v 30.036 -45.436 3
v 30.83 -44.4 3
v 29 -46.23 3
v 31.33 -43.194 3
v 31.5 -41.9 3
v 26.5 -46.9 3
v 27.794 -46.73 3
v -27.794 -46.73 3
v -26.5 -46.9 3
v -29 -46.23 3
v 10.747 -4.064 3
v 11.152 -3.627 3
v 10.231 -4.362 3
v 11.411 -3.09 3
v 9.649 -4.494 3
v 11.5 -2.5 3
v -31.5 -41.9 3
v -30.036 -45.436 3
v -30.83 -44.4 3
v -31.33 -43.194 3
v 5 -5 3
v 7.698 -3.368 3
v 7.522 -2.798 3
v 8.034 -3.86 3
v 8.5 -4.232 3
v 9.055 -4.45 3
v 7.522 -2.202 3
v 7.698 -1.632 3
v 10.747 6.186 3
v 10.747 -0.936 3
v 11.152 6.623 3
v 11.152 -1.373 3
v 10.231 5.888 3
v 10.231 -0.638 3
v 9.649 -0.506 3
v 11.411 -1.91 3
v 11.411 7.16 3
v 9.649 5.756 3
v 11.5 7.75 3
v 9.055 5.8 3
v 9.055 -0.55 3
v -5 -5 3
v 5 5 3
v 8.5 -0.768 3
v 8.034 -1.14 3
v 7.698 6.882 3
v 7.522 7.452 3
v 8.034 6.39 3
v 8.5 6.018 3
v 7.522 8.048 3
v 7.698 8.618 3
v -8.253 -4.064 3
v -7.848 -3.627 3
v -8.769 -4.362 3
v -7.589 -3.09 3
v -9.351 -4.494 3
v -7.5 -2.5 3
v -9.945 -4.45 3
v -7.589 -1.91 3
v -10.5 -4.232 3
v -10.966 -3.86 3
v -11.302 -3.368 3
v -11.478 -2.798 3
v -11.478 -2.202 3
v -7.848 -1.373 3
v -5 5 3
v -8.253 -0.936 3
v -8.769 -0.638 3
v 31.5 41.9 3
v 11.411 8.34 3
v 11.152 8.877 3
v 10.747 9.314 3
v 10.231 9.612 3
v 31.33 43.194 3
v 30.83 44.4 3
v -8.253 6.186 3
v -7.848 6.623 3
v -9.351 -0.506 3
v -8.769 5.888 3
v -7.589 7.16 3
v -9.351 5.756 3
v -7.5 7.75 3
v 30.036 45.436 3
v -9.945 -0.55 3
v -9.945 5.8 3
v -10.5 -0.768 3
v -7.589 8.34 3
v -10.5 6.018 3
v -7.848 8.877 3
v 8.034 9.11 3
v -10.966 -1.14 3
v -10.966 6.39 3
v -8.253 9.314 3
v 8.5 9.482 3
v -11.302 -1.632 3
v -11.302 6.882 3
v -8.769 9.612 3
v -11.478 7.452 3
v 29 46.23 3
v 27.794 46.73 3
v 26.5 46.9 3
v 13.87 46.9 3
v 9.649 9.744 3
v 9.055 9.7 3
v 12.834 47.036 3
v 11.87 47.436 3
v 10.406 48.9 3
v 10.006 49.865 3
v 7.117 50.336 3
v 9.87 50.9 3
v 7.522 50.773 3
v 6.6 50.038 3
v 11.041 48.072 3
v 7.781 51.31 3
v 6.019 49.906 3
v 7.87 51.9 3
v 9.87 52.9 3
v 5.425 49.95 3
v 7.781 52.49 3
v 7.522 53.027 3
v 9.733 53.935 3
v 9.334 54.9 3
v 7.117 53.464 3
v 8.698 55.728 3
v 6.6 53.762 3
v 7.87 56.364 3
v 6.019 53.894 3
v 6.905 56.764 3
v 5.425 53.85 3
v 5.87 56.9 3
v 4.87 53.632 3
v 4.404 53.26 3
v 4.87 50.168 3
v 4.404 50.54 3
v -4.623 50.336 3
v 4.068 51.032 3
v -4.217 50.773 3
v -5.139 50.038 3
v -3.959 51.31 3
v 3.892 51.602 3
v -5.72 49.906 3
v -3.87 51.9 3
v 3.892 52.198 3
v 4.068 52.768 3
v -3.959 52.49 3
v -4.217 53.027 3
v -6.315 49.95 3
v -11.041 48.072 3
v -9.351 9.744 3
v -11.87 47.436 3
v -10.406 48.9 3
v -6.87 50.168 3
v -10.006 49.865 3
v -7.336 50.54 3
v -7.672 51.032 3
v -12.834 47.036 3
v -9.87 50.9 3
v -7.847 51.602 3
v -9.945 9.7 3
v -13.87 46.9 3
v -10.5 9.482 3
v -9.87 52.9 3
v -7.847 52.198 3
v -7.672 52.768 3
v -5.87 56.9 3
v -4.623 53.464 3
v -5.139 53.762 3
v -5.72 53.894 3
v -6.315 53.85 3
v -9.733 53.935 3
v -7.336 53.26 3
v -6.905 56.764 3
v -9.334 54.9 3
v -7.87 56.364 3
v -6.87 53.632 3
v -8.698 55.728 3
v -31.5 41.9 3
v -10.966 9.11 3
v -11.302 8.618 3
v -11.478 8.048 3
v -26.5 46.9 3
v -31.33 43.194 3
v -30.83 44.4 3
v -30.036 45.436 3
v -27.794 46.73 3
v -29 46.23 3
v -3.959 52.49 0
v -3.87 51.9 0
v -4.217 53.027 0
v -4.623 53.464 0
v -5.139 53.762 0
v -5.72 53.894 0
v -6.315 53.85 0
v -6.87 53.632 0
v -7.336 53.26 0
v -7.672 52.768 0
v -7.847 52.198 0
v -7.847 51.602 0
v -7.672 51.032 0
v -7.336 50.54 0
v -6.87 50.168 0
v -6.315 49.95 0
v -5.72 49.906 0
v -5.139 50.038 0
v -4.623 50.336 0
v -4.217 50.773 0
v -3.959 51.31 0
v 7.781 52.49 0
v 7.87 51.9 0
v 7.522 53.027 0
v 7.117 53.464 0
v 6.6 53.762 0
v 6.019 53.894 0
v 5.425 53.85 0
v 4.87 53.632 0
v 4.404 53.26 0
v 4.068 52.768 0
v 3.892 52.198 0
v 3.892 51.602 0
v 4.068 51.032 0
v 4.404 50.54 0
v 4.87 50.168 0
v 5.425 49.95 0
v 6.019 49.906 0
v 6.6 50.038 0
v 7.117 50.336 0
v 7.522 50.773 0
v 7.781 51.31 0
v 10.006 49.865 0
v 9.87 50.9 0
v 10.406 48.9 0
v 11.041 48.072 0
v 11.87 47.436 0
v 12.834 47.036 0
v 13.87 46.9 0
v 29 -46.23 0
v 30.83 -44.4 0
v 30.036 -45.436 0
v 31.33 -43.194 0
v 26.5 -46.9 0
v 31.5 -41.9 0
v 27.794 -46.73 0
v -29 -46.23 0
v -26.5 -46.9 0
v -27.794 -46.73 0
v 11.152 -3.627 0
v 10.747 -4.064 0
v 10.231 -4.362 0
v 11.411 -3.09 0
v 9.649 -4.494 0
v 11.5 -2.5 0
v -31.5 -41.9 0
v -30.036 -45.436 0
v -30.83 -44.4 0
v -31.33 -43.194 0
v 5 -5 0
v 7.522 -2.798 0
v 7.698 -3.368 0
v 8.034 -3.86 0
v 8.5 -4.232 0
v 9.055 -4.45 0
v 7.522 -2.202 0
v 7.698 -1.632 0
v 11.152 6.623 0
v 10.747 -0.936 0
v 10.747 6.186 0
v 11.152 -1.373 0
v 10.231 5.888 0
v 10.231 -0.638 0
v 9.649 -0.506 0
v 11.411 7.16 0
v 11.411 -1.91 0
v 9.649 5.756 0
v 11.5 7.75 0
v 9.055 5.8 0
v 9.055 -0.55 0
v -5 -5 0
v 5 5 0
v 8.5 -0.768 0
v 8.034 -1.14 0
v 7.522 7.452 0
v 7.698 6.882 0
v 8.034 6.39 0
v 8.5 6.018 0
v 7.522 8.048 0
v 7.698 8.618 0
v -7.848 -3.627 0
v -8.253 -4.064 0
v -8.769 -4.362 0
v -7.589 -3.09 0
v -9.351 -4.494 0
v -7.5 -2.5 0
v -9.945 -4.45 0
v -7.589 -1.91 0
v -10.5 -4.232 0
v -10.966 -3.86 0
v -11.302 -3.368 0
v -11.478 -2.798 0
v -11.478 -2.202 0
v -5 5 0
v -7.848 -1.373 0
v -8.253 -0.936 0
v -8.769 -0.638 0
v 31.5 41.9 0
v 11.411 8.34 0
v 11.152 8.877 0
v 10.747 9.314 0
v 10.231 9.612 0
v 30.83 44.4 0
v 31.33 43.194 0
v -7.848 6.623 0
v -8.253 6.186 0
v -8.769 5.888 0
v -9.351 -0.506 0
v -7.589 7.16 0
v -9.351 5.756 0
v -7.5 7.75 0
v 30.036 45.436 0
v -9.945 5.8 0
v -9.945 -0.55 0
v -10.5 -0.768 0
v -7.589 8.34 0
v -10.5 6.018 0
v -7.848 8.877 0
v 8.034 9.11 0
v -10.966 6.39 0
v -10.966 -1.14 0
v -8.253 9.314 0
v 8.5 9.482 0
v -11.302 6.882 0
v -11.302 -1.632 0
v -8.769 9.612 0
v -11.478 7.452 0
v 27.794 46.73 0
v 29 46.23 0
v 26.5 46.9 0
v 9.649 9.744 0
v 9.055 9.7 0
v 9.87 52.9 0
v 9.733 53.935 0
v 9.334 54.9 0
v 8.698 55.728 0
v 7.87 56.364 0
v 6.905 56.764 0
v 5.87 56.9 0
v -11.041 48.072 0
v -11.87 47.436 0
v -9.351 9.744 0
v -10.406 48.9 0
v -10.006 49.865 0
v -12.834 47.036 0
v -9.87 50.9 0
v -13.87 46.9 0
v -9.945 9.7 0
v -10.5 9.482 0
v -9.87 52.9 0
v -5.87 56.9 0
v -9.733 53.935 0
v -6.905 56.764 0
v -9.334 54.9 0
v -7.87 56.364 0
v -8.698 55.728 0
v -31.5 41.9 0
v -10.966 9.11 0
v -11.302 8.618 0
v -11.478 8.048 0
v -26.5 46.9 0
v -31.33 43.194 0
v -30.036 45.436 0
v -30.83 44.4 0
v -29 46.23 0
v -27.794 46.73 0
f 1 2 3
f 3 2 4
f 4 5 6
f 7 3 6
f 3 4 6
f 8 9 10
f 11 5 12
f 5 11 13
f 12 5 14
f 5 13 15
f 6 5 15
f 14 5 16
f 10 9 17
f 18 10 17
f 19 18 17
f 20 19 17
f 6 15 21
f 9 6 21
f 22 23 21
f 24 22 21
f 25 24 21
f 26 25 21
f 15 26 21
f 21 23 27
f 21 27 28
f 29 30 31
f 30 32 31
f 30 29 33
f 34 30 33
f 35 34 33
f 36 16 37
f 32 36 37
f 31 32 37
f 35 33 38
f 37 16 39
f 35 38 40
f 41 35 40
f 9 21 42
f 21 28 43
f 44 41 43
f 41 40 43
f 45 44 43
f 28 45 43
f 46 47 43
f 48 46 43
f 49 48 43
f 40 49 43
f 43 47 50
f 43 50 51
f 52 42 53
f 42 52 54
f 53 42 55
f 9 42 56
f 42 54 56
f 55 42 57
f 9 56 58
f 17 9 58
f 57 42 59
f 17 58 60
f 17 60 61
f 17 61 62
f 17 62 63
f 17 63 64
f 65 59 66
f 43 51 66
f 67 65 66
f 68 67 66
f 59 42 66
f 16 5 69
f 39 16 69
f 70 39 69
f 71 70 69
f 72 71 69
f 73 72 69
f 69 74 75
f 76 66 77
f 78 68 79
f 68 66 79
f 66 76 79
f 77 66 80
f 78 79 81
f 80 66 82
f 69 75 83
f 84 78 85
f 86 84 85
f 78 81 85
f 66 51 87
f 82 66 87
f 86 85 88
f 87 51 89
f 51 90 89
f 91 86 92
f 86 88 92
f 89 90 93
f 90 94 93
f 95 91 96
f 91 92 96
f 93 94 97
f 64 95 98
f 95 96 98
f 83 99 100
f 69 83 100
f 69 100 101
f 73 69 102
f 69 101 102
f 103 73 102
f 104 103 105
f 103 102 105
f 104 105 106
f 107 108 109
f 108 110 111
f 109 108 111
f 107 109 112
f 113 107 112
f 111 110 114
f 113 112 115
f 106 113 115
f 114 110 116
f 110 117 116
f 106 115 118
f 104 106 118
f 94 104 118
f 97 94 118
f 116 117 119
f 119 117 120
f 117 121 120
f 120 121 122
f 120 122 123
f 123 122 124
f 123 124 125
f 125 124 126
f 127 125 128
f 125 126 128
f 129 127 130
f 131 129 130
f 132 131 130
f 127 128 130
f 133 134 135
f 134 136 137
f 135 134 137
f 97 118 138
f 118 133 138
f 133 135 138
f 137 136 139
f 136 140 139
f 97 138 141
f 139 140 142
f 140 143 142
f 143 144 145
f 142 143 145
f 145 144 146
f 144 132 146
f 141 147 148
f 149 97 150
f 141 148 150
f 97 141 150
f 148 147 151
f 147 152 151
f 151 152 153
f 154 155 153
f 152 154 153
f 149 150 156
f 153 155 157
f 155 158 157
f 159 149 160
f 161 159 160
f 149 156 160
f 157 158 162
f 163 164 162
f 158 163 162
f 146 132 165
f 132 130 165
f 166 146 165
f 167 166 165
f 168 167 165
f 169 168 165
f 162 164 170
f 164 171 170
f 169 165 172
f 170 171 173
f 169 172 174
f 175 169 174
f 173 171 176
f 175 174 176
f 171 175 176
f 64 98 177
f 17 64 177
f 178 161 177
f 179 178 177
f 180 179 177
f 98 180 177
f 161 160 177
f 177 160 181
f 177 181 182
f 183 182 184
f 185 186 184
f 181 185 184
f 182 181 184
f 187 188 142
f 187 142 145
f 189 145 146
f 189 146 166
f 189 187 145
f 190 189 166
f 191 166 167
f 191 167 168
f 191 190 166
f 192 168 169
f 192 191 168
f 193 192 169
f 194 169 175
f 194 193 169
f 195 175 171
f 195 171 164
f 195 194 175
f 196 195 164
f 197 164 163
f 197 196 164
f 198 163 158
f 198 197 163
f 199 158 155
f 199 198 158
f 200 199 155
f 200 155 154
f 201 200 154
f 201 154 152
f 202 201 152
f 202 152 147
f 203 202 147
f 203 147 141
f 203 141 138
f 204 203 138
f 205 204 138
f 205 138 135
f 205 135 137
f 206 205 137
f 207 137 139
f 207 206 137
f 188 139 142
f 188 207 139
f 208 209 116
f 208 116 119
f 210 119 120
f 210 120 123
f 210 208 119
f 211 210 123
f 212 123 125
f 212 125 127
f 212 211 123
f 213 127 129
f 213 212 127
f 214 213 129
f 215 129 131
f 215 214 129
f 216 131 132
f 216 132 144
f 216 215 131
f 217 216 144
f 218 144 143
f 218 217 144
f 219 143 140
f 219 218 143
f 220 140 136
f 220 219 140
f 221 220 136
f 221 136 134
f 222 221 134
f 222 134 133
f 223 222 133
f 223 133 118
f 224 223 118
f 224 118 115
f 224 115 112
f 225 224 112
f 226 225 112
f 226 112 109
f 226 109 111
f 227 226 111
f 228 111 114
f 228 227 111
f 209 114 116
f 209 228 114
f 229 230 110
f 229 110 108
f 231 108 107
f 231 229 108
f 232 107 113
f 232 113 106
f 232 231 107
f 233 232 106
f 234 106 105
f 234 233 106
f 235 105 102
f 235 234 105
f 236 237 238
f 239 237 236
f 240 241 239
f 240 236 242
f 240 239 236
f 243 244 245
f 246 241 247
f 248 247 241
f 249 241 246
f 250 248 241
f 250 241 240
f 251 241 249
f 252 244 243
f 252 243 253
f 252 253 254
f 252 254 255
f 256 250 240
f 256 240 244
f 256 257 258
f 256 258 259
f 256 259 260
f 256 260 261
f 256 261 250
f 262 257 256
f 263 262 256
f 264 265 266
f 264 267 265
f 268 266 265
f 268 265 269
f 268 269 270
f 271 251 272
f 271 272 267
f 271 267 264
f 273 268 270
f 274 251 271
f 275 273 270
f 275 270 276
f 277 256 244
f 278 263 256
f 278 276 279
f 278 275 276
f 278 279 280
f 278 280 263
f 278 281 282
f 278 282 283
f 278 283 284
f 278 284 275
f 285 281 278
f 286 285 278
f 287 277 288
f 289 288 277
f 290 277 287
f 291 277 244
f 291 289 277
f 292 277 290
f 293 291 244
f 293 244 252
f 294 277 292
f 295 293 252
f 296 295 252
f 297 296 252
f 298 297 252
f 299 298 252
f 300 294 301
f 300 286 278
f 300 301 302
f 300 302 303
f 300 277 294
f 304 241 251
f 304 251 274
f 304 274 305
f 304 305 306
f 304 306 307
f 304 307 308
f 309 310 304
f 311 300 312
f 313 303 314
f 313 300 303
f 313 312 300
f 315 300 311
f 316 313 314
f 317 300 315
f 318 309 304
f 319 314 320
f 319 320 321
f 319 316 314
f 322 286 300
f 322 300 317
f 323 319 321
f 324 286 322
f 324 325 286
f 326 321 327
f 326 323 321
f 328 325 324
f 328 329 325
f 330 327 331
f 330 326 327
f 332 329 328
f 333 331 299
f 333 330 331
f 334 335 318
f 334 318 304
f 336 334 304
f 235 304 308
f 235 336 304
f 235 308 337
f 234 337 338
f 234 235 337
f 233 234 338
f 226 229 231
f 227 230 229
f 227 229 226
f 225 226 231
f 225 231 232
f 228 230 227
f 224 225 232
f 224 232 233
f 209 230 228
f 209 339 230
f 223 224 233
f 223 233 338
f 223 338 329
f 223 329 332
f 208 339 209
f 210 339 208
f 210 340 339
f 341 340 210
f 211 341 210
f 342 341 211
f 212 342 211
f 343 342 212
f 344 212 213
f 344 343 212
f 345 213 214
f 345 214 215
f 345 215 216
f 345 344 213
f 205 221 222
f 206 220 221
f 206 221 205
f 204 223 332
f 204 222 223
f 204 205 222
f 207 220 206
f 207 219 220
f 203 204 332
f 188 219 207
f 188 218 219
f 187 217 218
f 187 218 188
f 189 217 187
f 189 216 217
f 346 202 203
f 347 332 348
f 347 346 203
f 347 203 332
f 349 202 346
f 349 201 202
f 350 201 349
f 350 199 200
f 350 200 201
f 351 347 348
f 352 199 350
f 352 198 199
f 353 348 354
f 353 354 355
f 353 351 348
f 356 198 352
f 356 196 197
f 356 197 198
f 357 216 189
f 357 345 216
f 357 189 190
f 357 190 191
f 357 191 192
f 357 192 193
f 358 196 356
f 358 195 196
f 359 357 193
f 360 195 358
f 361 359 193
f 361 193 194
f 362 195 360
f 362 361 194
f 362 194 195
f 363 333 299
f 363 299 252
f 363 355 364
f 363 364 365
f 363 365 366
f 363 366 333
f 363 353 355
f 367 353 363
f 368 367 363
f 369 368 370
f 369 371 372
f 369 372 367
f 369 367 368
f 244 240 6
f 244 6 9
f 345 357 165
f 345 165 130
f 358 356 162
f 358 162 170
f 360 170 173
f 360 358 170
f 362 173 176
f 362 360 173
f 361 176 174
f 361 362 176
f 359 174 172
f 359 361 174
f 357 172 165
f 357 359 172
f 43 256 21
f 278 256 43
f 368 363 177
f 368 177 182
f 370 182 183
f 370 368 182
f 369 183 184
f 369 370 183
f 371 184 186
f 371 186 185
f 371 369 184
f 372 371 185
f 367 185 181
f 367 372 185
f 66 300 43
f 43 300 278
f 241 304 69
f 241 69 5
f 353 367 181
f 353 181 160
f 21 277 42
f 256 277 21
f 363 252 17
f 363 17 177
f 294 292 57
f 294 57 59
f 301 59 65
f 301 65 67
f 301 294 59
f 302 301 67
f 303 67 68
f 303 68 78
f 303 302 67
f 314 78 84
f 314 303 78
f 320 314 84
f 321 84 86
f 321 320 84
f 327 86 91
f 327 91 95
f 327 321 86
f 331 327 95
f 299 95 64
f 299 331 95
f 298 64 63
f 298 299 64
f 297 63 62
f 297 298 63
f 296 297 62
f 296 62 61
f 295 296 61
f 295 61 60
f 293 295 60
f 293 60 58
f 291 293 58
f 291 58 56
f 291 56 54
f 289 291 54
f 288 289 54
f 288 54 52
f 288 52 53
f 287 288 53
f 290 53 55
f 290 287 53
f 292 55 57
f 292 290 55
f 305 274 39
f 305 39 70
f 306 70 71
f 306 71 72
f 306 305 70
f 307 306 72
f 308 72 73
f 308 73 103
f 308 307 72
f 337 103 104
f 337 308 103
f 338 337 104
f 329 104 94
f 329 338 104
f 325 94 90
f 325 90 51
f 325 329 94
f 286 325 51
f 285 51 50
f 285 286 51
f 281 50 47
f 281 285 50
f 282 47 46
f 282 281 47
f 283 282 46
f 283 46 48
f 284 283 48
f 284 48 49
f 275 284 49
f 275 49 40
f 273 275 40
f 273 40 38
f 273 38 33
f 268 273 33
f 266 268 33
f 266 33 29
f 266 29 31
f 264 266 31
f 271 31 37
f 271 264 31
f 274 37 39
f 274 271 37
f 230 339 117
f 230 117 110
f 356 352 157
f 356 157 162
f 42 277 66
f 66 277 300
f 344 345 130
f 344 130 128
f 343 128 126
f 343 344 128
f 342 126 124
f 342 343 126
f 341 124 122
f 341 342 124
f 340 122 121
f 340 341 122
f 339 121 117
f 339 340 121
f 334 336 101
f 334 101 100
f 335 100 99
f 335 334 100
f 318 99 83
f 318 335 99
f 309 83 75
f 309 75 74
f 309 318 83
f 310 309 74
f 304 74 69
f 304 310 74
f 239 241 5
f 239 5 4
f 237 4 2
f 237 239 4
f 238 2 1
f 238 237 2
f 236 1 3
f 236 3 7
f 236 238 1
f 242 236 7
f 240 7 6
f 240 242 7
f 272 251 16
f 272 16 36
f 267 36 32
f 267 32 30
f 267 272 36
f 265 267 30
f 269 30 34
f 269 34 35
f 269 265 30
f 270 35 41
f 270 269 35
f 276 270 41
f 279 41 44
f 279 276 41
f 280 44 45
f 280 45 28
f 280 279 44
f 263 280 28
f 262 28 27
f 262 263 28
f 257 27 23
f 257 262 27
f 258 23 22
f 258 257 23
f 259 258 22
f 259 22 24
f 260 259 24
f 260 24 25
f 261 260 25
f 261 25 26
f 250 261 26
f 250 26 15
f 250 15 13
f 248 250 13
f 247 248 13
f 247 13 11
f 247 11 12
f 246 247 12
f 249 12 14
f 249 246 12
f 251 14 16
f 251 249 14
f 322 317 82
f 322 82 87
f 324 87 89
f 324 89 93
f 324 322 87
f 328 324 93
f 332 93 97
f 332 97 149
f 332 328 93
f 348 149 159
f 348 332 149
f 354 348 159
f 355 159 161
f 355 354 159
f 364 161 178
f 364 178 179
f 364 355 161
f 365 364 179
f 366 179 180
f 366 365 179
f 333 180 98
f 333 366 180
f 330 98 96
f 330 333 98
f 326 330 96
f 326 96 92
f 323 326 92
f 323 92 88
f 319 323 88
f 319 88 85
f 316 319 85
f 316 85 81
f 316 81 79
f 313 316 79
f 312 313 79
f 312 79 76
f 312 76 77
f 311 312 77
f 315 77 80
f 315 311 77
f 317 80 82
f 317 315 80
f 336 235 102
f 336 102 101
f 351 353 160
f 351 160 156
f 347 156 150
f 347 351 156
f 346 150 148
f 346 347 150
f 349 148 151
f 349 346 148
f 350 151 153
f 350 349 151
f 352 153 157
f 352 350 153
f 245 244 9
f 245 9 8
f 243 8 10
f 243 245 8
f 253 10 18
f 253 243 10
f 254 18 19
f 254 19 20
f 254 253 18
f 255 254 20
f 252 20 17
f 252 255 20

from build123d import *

# Parameters (mm, degrees)
SKETCH_1_R      = 2
SKETCH_1_W      = 10
SKETCH_1_H      = 10
EXTRUDE_1_DEPTH = 3


with BuildPart() as part:
    # Эскиз1 → Бобышка-Вытянуть1 (new body)
    with BuildSketch(Plane.XY):
        with BuildLine():
            Line((13.869679809, 46.9), (26.5, 46.9))
            ThreePointArc((26.5, 46.9), (30.035533906, 45.435533906), (31.5, 41.9))
            Line((31.5, 41.9), (31.5, -41.9))
            ThreePointArc((31.5, -41.9), (30.035533906, -45.435533906), (26.5, -46.9))
            Line((26.5, -46.9), (-26.5, -46.9))
            ThreePointArc((-26.5, -46.9), (-30.035533906, -45.435533906), (-31.5, -41.9))
            Line((-31.5, -41.9), (-31.5, 41.9))
            ThreePointArc((-31.5, 41.9), (-30.035533906, 45.435533906), (-26.5, 46.9))
            Line((-26.5, 46.9), (-13.869679809, 46.9))
            ThreePointArc((-13.869679809, 46.9), (-11.041252684, 48.071572875), (-9.869679809, 50.9))
            Line((-9.869679809, 50.9), (-9.869679809, 52.9))
            ThreePointArc((-9.869679809, 52.9), (-8.698106934, 55.728427125), (-5.869679809, 56.9))
            Line((-5.869679809, 56.9), (5.869679809, 56.9))
            ThreePointArc((5.869679809, 56.9), (8.698106934, 55.728427125), (9.869679809, 52.9))
            Line((9.869679809, 52.9), (9.869679809, 50.9))
            ThreePointArc((9.869679809, 50.9), (11.041252684, 48.071572875), (13.869679809, 46.9))
        make_face()
        with Locations((-5.869679809, 51.9)):
            Circle(SKETCH_1_R, mode=Mode.SUBTRACT)
        with Locations((5.869679809, 51.9)):
            Circle(SKETCH_1_R, mode=Mode.SUBTRACT)
        with Locations((9.5, -2.5)):
            Circle(SKETCH_1_R, mode=Mode.SUBTRACT)
        with Locations((-9.5, -2.5)):
            Circle(SKETCH_1_R, mode=Mode.SUBTRACT)
        with Locations((-9.5, 7.75)):
            Circle(SKETCH_1_R, mode=Mode.SUBTRACT)
        with Locations((9.5, 7.75)):
            Circle(SKETCH_1_R, mode=Mode.SUBTRACT)
        Rectangle(SKETCH_1_W, SKETCH_1_H, mode=Mode.SUBTRACT)
    extrude(amount=EXTRUDE_1_DEPTH)


solid = part.part
